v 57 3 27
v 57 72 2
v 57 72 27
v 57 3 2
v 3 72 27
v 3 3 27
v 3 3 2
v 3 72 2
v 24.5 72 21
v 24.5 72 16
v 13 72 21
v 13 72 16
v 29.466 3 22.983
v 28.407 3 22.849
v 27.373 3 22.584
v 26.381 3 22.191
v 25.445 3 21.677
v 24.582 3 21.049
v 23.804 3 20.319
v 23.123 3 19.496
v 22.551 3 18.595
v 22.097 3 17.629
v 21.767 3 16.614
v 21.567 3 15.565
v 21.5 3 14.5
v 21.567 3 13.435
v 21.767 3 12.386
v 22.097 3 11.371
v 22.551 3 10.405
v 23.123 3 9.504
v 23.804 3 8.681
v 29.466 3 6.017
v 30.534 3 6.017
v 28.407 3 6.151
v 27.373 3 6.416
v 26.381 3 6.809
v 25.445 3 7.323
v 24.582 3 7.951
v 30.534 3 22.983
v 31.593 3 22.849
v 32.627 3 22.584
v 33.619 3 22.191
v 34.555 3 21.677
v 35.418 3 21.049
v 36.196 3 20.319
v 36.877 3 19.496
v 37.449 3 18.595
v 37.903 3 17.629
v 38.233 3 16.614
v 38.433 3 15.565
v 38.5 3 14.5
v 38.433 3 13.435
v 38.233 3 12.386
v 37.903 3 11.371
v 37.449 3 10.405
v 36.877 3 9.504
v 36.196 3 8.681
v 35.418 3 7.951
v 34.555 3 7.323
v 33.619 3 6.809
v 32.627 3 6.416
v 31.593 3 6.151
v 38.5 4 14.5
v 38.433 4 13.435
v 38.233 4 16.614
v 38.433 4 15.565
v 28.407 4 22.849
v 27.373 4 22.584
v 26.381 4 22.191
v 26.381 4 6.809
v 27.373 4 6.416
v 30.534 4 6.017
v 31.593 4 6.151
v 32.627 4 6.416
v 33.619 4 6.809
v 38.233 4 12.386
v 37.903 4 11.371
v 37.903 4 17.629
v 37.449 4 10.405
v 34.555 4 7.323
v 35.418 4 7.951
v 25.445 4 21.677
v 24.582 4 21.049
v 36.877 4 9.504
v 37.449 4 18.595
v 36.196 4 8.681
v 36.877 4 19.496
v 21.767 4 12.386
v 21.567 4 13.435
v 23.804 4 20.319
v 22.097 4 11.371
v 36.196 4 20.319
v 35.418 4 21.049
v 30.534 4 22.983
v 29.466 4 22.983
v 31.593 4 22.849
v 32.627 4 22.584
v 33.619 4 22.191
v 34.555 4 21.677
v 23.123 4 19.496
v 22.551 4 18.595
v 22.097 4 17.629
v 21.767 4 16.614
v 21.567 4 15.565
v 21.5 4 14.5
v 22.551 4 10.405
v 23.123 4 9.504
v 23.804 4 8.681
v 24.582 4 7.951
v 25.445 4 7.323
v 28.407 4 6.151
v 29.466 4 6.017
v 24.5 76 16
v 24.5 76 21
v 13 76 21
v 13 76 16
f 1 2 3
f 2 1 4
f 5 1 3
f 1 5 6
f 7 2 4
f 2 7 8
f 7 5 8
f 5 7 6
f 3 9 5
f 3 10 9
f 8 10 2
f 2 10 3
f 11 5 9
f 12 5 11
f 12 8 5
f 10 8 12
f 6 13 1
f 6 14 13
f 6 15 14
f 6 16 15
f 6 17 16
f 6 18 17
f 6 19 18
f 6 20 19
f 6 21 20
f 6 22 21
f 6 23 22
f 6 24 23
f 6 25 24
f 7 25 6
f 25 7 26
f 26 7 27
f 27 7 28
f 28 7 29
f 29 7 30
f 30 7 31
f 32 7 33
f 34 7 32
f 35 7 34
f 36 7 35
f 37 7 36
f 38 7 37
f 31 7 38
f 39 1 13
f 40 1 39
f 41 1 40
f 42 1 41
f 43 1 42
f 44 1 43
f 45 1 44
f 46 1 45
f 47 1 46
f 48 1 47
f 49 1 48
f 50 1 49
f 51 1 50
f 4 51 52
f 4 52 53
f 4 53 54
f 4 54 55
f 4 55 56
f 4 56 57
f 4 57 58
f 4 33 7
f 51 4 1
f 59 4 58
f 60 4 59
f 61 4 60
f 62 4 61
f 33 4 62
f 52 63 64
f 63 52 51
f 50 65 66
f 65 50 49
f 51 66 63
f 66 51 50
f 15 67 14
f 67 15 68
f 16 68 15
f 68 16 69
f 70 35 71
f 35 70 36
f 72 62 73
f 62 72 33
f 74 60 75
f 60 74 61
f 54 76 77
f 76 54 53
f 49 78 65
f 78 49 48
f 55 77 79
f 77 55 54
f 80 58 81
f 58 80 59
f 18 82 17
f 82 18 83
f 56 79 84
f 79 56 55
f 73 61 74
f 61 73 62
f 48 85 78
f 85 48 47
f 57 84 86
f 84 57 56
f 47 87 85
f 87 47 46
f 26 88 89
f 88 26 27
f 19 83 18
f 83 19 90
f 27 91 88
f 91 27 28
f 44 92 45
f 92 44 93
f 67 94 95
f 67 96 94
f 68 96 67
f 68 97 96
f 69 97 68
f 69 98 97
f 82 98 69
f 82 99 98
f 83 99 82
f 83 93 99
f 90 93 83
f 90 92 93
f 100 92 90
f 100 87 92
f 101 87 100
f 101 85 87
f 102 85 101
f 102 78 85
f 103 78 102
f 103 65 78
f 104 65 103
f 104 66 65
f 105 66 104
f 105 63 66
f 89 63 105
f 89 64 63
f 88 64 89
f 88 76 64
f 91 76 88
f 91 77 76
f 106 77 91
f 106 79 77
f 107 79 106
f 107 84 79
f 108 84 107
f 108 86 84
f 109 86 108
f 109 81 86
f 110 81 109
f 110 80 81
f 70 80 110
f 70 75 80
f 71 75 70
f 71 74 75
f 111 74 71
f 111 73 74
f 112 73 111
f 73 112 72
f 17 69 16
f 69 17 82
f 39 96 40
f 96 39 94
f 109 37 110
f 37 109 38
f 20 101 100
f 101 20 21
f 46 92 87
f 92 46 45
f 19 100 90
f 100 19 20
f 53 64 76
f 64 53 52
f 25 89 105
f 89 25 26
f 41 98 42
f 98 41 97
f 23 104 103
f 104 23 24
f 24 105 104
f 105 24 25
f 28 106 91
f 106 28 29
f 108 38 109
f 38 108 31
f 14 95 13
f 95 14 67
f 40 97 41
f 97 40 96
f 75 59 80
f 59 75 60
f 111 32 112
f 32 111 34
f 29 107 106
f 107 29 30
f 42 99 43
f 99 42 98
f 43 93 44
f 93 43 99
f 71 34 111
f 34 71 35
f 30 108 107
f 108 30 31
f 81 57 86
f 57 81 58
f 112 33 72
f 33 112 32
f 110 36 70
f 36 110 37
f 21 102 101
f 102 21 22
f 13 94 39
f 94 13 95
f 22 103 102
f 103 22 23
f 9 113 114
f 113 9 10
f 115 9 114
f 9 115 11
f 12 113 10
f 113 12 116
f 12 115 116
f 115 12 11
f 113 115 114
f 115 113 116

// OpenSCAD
placa_x=54;
placa_y=69; //56 + lugar para el prensacables
placa_z=25;

ancho_tapa=2;
ancho_pared=3;
alto_tapa=14;
radio_prensacable=8.5;

ancho_usb=11.5;
alto_usb=8;

difference(){
    %cube([placa_x+ancho_pared*2, placa_y+ancho_pared*2, placa_z+ancho_tapa*2]);
    
    translate([ancho_pared, ancho_pared, ancho_tapa])
        cube([placa_x, placa_y, placa_z]);
    //translate([0.5*ancho_pared, 0.5*ancho_pared, alto_tapa-4])
    //    cube([placa_x+ancho_pared, placa_y+ancho_pared, 4]);
    translate([(placa_x+ancho_pared*2)/2, ancho_pared+1, (placa_z+ancho_tapa*2)/2])
        rotate([90, 0, 0])
            #cylinder(r=radio_prensacable, h=ancho_pared+2, $fn=50);
}

translate([ancho_pared+10, placa_y-1, 16])
    #cube([ancho_usb, alto_usb, ancho_pared+2]);
